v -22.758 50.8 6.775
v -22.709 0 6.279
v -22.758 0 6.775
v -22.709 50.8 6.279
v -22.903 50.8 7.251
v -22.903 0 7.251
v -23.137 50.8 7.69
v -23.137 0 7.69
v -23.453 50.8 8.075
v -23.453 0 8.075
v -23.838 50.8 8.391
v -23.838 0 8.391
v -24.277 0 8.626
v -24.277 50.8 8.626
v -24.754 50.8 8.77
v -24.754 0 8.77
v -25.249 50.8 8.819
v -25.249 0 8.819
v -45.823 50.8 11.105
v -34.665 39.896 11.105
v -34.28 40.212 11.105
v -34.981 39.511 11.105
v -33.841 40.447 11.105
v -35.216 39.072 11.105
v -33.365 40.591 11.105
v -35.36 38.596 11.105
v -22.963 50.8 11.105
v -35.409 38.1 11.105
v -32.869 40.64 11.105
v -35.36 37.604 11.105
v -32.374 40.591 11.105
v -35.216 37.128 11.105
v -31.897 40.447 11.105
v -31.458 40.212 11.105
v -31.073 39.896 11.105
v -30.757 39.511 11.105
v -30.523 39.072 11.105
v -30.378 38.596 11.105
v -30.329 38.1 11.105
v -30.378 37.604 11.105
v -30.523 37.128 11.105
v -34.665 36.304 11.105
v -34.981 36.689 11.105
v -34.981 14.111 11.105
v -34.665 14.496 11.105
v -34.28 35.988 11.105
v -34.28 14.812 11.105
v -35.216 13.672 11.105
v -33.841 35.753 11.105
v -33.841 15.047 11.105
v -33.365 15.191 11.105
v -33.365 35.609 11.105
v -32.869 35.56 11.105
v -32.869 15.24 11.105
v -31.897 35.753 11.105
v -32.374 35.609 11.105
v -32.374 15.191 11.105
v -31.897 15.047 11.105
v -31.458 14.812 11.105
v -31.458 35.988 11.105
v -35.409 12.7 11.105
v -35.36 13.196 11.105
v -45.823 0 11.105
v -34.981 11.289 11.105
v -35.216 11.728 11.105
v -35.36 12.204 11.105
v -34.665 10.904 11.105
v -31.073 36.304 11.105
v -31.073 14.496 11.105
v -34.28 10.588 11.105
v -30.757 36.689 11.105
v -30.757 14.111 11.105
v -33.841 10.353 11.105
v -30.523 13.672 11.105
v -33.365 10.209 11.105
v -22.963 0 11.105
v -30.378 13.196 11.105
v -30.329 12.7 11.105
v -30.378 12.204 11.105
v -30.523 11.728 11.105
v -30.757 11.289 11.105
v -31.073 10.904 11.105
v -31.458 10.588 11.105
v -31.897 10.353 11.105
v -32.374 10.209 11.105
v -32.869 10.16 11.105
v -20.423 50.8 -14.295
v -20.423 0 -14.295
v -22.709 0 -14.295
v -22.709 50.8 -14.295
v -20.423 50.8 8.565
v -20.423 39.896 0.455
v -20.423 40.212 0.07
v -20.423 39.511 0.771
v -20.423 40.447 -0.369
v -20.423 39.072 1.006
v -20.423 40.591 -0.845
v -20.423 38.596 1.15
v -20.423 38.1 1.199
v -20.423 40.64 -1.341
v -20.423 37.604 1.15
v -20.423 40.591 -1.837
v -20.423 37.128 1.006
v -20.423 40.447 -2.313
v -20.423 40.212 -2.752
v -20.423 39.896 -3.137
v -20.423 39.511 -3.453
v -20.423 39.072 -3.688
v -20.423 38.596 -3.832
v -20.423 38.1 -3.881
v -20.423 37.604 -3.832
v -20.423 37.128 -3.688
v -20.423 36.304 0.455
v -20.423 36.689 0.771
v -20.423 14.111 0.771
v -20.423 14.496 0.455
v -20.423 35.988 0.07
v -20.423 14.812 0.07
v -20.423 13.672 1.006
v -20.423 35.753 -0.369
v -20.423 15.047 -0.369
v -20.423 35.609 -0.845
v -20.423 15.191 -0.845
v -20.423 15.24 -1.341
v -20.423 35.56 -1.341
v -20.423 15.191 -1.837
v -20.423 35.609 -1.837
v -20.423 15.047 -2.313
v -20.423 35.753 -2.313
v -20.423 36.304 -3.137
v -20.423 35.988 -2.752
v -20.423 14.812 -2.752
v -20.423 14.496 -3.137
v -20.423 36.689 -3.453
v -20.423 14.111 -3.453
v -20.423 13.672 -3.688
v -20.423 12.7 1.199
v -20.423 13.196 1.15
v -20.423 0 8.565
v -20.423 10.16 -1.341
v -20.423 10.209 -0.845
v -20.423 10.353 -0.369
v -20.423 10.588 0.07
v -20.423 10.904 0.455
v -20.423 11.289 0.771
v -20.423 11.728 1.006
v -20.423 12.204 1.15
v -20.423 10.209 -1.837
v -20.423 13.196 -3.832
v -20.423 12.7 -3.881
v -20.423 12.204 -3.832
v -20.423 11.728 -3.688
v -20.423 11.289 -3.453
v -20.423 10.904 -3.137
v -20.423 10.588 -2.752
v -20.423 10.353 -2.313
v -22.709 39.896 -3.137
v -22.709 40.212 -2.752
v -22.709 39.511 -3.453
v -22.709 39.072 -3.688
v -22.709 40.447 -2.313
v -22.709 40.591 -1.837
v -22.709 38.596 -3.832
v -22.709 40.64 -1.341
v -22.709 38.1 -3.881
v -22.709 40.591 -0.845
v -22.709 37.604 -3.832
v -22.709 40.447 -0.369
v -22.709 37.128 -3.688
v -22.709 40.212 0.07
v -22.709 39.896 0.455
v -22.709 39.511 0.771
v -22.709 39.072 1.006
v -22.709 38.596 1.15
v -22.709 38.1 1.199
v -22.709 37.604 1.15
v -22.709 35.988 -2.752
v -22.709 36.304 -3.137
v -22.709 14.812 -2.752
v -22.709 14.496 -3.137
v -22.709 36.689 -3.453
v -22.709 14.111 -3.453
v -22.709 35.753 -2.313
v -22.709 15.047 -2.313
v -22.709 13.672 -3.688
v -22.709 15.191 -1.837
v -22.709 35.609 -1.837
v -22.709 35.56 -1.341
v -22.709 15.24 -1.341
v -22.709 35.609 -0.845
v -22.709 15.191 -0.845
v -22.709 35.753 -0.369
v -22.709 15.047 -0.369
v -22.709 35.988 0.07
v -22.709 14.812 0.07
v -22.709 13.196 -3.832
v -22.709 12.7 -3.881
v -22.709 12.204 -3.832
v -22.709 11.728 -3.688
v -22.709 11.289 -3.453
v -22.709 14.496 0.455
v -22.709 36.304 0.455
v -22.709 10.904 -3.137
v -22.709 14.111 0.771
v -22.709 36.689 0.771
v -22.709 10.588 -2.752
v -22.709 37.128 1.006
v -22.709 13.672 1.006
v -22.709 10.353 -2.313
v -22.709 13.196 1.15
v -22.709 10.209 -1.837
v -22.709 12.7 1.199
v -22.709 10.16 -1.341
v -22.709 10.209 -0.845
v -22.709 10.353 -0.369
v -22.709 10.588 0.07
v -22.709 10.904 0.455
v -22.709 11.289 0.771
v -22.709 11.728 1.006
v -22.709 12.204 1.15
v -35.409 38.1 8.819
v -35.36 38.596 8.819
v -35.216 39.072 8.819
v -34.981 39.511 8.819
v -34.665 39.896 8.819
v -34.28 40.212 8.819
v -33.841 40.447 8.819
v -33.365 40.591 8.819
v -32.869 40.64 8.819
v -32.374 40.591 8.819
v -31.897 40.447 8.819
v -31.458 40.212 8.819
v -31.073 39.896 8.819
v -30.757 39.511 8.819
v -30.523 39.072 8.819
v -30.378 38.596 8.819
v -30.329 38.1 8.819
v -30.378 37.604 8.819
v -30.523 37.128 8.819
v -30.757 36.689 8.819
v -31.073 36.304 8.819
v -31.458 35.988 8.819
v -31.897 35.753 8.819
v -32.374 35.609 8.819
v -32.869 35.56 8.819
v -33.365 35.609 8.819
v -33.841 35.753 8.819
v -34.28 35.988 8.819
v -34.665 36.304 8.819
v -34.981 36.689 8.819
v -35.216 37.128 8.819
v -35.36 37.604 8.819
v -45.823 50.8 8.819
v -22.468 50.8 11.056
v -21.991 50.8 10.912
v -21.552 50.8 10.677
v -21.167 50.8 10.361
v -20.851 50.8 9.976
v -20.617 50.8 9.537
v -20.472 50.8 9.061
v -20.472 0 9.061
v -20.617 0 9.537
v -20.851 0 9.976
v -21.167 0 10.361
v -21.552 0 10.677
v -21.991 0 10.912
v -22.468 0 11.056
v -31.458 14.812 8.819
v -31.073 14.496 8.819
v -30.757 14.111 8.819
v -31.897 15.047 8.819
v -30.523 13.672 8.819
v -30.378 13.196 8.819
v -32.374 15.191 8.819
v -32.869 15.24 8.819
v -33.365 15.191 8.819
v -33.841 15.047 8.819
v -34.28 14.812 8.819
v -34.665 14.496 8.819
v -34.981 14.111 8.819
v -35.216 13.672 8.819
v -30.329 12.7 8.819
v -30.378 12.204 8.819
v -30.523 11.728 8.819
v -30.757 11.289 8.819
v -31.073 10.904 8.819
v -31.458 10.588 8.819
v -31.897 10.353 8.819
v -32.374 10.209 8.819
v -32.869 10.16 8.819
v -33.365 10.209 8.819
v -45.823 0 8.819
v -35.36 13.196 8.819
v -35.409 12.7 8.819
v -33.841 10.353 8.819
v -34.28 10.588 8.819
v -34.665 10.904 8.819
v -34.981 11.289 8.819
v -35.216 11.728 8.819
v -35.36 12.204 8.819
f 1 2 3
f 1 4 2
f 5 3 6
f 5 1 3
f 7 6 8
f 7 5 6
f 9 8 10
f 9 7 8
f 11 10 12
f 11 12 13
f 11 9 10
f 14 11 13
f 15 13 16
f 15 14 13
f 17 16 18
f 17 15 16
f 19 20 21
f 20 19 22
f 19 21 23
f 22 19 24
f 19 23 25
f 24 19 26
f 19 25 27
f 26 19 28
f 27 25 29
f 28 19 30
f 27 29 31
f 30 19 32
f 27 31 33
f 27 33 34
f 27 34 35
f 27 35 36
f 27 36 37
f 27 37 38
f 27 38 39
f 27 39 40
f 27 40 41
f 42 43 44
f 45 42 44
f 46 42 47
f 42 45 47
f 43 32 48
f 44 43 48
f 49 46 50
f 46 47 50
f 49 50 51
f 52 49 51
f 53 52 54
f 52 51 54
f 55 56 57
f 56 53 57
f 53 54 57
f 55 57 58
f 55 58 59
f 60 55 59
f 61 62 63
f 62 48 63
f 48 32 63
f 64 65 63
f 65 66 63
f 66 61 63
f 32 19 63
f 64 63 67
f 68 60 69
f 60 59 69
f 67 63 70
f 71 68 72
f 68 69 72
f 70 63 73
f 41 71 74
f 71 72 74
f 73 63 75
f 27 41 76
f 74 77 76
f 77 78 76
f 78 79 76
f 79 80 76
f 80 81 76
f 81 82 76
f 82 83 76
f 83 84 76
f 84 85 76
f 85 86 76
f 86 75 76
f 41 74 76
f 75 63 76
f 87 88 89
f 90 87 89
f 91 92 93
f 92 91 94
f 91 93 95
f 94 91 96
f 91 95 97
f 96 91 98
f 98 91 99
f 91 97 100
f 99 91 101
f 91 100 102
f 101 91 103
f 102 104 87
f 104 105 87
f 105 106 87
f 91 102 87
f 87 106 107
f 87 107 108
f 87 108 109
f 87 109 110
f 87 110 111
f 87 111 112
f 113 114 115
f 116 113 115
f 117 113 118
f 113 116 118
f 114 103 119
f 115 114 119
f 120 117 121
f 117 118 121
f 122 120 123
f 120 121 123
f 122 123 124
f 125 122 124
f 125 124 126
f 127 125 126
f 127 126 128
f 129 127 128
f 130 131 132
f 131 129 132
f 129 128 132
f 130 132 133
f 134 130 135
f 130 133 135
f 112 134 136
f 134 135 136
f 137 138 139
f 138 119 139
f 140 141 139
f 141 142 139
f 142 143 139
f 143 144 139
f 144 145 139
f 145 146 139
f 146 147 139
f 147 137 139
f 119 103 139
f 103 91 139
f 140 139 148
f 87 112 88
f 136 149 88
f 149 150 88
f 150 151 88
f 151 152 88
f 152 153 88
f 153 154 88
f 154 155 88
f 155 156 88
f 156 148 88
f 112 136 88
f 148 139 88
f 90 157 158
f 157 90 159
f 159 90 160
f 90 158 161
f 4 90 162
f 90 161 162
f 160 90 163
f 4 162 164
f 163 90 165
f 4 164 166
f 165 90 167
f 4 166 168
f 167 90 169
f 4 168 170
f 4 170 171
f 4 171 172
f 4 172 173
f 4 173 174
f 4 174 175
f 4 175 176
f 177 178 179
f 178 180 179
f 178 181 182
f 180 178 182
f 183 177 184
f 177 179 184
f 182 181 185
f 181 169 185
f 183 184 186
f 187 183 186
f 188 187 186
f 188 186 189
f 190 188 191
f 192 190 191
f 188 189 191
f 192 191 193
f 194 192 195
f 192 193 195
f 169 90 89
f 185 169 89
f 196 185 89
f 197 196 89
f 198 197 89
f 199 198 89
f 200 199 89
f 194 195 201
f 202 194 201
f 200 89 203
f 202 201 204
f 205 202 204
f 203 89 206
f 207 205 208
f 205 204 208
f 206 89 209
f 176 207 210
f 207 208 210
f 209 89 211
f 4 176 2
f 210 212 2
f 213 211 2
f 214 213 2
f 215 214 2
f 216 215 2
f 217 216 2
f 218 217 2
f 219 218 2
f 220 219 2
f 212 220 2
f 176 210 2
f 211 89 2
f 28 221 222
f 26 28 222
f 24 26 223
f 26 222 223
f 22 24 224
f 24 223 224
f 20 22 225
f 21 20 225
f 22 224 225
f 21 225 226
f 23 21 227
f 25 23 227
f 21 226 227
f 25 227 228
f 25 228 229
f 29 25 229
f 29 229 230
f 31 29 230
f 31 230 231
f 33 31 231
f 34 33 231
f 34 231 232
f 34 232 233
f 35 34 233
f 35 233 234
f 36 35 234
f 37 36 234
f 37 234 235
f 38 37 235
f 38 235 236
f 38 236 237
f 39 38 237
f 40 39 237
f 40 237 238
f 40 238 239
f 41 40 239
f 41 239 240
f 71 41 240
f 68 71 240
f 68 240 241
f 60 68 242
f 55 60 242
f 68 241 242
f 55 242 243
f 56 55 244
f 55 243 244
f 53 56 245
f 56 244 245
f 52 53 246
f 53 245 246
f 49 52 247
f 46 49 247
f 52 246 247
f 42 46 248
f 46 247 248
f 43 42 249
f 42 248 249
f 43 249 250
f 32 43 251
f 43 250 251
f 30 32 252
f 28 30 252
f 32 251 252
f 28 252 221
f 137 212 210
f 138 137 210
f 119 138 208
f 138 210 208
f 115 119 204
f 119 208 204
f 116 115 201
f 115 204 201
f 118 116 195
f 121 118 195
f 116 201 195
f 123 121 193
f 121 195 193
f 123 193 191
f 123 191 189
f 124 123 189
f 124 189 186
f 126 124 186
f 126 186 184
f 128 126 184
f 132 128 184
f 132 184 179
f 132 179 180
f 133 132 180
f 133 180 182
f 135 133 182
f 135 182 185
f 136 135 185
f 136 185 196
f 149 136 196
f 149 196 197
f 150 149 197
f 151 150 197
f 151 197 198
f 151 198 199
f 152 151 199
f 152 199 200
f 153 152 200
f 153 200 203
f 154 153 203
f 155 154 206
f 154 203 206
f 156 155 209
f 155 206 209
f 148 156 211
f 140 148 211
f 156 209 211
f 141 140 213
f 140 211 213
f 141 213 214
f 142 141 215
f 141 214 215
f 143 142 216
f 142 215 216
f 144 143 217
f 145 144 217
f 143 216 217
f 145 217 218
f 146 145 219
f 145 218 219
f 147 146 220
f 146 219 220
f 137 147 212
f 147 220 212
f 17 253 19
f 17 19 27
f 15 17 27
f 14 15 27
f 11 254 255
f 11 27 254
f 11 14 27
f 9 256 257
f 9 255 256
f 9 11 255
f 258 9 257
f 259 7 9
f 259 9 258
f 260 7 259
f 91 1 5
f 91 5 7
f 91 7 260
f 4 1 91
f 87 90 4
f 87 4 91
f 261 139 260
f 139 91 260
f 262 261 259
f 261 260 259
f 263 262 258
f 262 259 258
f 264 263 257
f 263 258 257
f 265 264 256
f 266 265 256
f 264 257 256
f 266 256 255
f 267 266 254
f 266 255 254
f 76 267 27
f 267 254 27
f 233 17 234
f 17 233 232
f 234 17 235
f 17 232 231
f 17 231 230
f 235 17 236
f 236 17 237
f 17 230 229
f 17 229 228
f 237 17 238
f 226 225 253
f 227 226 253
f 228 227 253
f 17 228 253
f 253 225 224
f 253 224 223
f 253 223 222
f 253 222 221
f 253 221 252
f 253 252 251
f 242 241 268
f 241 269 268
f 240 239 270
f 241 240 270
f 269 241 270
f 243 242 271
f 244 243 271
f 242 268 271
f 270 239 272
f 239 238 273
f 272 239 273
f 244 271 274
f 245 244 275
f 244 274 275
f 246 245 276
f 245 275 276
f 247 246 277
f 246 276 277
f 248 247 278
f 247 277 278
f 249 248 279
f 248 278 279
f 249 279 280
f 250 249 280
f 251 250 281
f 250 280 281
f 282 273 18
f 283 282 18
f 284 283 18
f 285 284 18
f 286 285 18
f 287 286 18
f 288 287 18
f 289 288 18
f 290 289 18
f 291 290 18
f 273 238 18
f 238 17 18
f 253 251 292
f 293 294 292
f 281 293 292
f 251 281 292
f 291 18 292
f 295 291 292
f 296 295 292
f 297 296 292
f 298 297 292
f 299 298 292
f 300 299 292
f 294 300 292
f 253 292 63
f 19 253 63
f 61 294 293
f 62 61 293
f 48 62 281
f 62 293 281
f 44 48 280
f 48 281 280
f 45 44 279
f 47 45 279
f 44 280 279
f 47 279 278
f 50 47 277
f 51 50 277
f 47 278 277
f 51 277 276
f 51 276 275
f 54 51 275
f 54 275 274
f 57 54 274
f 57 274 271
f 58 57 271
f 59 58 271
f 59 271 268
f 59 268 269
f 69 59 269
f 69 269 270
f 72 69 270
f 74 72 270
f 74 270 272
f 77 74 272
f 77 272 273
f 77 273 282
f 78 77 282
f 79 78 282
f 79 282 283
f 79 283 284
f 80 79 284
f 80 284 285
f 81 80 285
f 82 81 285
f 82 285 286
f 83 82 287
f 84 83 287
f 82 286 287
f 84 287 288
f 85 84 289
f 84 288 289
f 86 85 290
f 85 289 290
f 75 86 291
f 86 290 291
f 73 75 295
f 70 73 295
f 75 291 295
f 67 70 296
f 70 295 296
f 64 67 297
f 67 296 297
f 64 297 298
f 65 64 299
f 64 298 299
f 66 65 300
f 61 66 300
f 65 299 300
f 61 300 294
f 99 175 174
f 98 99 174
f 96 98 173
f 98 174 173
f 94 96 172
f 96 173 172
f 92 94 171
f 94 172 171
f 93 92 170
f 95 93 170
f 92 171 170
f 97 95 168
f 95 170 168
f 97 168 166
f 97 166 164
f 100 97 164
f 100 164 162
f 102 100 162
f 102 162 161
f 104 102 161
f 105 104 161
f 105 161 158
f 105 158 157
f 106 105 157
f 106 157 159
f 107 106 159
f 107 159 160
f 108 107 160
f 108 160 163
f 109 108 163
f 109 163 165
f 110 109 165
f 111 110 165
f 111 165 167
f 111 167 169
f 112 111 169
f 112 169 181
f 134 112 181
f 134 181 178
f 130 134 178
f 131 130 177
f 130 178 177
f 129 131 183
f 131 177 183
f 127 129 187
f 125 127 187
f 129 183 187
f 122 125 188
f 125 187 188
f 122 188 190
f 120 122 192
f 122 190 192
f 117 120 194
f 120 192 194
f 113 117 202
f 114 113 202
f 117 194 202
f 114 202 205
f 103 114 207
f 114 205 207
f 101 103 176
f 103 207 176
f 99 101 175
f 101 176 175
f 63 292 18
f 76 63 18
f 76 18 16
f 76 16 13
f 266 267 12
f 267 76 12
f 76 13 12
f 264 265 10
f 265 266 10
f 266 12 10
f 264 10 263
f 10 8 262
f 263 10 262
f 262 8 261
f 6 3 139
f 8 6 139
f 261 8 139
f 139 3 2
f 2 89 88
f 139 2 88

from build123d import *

# Parameters (mm, degrees)
BOSS_EXTRUDE1_DEPTH = 50.8
FILLET1_R           = 2.54
FILLET2_R           = 2.54
SKETCH7_R           = 2.54
CUT_EXTRUDE1_DEPTH  = 50.8
SKETCH3_R           = 2.54
CUT_EXTRUDE2_DEPTH  = 50.8


with BuildPart() as part:
    # Sketch2 → Boss-Extrude1 (new body)
    with BuildSketch(Plane(origin=(0, 0, 0), x_dir=(1, 0, 0), z_dir=(0, 1, 0))):
        Polygon((-22.709183551, 14.294994846), (-22.709183551, -8.819005154), (-45.823183551, -8.819005154), (-45.823183551, -11.105005154), (-20.423183551, -11.105005154), (-20.423183551, 14.294994846), align=None)
    extrude(amount=BOSS_EXTRUDE1_DEPTH)

    # Fillet1
    fillet1_edges = [part.edges().sort_by_distance(p)[0] for p in [
        (-22.709183551, 25.4, 8.819005154),
    ]]
    fillet(fillet1_edges, radius=FILLET1_R)

    # Fillet2
    fillet2_edges = [part.edges().sort_by_distance(p)[0] for p in [
        (-20.423183551, 25.4, 11.105005154),
    ]]
    fillet(fillet2_edges, radius=FILLET2_R)

    # Sketch7 → Cut-Extrude1 (cut)
    with BuildSketch(Plane(origin=(0, 0, 8.819005154), x_dir=(-1, 0, 0), z_dir=(0, 0, -1))):
        with Locations((32.869183551, 38.1)):
            Circle(SKETCH7_R)
        with Locations((32.869183551, 12.7)):
            Circle(SKETCH7_R)
    extrude(amount=-CUT_EXTRUDE1_DEPTH, mode=Mode.SUBTRACT)

    # Sketch3 → Cut-Extrude2 (cut)
    with BuildSketch(Plane.ZY.offset(22.709183551)):
        with Locations((-1.340994846, 12.7)):
            Circle(SKETCH3_R)
        with Locations((-1.340994846, 38.1)):
            Circle(SKETCH3_R)
    extrude(amount=-CUT_EXTRUDE2_DEPTH, mode=Mode.SUBTRACT)


solid = part.part
